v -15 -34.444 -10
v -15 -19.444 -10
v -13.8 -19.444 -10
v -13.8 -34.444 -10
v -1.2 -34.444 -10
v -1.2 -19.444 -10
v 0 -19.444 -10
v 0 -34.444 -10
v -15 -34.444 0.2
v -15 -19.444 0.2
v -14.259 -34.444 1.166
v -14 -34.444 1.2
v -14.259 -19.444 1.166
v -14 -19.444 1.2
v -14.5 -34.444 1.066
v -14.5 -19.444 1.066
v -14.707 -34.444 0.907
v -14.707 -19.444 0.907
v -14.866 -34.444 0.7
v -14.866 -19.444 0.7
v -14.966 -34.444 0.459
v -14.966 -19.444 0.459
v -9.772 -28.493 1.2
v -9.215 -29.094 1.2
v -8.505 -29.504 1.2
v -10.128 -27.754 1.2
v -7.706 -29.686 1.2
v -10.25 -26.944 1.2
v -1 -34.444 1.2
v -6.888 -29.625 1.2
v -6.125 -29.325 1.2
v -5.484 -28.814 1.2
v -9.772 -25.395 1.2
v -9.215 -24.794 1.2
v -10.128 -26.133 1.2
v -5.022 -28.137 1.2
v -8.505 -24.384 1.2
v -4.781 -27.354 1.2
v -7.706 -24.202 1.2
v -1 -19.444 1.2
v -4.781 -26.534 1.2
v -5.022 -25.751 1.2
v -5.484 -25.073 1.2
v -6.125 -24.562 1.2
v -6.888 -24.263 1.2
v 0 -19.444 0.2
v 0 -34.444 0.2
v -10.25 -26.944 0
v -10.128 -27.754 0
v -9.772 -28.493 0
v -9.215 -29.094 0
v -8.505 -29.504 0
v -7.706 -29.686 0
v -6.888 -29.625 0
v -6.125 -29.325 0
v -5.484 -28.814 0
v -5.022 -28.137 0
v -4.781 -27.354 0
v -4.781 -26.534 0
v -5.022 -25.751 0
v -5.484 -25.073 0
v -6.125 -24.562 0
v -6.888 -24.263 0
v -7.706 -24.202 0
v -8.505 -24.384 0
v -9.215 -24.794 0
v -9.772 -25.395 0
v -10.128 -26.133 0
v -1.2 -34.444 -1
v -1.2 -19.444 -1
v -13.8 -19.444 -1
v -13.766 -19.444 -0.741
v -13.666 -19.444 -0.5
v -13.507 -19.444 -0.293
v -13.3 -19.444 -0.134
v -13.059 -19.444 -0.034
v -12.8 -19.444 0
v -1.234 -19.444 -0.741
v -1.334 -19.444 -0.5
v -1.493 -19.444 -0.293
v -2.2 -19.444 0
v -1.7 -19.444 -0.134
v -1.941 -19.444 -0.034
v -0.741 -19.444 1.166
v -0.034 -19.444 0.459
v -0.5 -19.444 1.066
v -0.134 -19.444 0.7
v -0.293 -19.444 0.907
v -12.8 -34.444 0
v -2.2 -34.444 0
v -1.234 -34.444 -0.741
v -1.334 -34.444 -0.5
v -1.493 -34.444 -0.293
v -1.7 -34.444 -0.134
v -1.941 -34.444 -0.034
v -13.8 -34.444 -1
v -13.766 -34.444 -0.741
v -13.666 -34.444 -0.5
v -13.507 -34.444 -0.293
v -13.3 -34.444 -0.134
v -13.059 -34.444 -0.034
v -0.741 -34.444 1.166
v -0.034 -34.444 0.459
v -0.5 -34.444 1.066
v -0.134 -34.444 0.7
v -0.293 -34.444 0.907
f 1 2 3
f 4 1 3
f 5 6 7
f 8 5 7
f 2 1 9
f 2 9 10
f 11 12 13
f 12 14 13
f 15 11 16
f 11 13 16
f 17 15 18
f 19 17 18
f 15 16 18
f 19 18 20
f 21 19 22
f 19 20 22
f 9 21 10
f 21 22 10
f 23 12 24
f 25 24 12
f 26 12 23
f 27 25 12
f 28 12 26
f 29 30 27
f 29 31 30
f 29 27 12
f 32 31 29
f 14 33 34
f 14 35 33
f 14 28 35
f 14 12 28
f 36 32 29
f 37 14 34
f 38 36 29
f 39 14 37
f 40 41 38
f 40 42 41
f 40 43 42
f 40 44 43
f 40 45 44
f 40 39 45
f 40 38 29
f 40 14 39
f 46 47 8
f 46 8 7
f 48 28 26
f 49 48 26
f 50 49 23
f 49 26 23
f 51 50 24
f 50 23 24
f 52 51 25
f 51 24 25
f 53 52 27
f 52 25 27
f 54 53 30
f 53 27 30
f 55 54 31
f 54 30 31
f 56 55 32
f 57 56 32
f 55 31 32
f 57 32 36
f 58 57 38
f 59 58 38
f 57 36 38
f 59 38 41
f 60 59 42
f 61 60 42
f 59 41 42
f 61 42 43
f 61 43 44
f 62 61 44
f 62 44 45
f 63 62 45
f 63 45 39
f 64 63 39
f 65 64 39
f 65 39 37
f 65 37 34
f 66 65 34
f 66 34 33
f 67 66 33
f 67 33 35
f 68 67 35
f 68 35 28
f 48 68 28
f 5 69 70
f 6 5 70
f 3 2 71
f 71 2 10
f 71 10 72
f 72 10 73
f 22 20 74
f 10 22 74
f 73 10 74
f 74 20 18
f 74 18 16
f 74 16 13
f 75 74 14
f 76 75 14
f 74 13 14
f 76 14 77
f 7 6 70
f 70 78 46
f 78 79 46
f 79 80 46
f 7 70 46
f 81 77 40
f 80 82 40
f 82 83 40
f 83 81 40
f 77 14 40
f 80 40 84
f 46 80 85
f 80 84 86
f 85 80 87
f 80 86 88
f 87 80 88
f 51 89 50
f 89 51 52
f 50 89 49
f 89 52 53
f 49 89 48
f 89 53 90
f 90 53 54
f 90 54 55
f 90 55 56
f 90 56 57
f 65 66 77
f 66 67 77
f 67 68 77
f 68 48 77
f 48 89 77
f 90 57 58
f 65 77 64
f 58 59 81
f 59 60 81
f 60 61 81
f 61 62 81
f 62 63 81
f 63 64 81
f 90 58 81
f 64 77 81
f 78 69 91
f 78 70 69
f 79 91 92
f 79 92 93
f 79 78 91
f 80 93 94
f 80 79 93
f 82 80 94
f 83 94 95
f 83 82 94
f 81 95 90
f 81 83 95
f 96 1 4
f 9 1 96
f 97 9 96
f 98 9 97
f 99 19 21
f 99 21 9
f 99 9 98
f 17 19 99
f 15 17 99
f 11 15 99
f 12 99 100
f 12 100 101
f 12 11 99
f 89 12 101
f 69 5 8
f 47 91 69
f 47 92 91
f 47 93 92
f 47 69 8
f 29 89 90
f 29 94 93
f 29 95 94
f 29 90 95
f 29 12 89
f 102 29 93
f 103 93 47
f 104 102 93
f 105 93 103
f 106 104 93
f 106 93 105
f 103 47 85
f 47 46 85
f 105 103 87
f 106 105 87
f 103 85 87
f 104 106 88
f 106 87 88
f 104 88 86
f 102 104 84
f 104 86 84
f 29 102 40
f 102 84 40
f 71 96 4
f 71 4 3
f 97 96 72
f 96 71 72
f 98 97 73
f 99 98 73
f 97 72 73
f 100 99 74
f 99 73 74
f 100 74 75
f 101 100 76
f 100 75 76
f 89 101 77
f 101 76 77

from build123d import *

# Parameters (mm, degrees)
F0_W     = 15
F0_H     = 15
F2_DEPTH = 1.2
F3_W     = 1.2
F3_H     = 15
F4_DEPTH = 10
F5_R     = 1
F6_D     = 5.5


with BuildPart() as f2:
    # F0 (on Top) → F2 (new body)
    with BuildSketch(Plane.XY):
        with Locations((-7.5, -26.9438664615)):
            Rectangle(F0_W, F0_H)
    extrude(amount=F2_DEPTH)

    # F3 (on face) → F4 (join)
    with BuildSketch(Plane.XY):
        with Locations((-0.6, -26.9438664615)):
            Rectangle(F3_W, F3_H)
        with Locations((-14.4, -26.9438664615)):
            Rectangle(F3_W, F3_H)
    extrude(amount=-F4_DEPTH)

    # F5
    f5_edges = [f2.edges().sort_by_distance(p)[0] for p in [
        (-15, -26.943866, 1.2),
        (0, -26.943866, 1.2),
        (-1.2, -26.943866, 0),
        (-13.8, -26.943866, 0),
    ]]
    fillet(f5_edges, radius=F5_R)

    # F6 (through all)
    with Locations(Plane(origin=(0, 0, 0), x_dir=(1, 0, 0), z_dir=(0, 0, -1))):
        with Locations((-7.5, 26.9438664615)):
            Hole(F6_D / 2)


solid = f2.part
